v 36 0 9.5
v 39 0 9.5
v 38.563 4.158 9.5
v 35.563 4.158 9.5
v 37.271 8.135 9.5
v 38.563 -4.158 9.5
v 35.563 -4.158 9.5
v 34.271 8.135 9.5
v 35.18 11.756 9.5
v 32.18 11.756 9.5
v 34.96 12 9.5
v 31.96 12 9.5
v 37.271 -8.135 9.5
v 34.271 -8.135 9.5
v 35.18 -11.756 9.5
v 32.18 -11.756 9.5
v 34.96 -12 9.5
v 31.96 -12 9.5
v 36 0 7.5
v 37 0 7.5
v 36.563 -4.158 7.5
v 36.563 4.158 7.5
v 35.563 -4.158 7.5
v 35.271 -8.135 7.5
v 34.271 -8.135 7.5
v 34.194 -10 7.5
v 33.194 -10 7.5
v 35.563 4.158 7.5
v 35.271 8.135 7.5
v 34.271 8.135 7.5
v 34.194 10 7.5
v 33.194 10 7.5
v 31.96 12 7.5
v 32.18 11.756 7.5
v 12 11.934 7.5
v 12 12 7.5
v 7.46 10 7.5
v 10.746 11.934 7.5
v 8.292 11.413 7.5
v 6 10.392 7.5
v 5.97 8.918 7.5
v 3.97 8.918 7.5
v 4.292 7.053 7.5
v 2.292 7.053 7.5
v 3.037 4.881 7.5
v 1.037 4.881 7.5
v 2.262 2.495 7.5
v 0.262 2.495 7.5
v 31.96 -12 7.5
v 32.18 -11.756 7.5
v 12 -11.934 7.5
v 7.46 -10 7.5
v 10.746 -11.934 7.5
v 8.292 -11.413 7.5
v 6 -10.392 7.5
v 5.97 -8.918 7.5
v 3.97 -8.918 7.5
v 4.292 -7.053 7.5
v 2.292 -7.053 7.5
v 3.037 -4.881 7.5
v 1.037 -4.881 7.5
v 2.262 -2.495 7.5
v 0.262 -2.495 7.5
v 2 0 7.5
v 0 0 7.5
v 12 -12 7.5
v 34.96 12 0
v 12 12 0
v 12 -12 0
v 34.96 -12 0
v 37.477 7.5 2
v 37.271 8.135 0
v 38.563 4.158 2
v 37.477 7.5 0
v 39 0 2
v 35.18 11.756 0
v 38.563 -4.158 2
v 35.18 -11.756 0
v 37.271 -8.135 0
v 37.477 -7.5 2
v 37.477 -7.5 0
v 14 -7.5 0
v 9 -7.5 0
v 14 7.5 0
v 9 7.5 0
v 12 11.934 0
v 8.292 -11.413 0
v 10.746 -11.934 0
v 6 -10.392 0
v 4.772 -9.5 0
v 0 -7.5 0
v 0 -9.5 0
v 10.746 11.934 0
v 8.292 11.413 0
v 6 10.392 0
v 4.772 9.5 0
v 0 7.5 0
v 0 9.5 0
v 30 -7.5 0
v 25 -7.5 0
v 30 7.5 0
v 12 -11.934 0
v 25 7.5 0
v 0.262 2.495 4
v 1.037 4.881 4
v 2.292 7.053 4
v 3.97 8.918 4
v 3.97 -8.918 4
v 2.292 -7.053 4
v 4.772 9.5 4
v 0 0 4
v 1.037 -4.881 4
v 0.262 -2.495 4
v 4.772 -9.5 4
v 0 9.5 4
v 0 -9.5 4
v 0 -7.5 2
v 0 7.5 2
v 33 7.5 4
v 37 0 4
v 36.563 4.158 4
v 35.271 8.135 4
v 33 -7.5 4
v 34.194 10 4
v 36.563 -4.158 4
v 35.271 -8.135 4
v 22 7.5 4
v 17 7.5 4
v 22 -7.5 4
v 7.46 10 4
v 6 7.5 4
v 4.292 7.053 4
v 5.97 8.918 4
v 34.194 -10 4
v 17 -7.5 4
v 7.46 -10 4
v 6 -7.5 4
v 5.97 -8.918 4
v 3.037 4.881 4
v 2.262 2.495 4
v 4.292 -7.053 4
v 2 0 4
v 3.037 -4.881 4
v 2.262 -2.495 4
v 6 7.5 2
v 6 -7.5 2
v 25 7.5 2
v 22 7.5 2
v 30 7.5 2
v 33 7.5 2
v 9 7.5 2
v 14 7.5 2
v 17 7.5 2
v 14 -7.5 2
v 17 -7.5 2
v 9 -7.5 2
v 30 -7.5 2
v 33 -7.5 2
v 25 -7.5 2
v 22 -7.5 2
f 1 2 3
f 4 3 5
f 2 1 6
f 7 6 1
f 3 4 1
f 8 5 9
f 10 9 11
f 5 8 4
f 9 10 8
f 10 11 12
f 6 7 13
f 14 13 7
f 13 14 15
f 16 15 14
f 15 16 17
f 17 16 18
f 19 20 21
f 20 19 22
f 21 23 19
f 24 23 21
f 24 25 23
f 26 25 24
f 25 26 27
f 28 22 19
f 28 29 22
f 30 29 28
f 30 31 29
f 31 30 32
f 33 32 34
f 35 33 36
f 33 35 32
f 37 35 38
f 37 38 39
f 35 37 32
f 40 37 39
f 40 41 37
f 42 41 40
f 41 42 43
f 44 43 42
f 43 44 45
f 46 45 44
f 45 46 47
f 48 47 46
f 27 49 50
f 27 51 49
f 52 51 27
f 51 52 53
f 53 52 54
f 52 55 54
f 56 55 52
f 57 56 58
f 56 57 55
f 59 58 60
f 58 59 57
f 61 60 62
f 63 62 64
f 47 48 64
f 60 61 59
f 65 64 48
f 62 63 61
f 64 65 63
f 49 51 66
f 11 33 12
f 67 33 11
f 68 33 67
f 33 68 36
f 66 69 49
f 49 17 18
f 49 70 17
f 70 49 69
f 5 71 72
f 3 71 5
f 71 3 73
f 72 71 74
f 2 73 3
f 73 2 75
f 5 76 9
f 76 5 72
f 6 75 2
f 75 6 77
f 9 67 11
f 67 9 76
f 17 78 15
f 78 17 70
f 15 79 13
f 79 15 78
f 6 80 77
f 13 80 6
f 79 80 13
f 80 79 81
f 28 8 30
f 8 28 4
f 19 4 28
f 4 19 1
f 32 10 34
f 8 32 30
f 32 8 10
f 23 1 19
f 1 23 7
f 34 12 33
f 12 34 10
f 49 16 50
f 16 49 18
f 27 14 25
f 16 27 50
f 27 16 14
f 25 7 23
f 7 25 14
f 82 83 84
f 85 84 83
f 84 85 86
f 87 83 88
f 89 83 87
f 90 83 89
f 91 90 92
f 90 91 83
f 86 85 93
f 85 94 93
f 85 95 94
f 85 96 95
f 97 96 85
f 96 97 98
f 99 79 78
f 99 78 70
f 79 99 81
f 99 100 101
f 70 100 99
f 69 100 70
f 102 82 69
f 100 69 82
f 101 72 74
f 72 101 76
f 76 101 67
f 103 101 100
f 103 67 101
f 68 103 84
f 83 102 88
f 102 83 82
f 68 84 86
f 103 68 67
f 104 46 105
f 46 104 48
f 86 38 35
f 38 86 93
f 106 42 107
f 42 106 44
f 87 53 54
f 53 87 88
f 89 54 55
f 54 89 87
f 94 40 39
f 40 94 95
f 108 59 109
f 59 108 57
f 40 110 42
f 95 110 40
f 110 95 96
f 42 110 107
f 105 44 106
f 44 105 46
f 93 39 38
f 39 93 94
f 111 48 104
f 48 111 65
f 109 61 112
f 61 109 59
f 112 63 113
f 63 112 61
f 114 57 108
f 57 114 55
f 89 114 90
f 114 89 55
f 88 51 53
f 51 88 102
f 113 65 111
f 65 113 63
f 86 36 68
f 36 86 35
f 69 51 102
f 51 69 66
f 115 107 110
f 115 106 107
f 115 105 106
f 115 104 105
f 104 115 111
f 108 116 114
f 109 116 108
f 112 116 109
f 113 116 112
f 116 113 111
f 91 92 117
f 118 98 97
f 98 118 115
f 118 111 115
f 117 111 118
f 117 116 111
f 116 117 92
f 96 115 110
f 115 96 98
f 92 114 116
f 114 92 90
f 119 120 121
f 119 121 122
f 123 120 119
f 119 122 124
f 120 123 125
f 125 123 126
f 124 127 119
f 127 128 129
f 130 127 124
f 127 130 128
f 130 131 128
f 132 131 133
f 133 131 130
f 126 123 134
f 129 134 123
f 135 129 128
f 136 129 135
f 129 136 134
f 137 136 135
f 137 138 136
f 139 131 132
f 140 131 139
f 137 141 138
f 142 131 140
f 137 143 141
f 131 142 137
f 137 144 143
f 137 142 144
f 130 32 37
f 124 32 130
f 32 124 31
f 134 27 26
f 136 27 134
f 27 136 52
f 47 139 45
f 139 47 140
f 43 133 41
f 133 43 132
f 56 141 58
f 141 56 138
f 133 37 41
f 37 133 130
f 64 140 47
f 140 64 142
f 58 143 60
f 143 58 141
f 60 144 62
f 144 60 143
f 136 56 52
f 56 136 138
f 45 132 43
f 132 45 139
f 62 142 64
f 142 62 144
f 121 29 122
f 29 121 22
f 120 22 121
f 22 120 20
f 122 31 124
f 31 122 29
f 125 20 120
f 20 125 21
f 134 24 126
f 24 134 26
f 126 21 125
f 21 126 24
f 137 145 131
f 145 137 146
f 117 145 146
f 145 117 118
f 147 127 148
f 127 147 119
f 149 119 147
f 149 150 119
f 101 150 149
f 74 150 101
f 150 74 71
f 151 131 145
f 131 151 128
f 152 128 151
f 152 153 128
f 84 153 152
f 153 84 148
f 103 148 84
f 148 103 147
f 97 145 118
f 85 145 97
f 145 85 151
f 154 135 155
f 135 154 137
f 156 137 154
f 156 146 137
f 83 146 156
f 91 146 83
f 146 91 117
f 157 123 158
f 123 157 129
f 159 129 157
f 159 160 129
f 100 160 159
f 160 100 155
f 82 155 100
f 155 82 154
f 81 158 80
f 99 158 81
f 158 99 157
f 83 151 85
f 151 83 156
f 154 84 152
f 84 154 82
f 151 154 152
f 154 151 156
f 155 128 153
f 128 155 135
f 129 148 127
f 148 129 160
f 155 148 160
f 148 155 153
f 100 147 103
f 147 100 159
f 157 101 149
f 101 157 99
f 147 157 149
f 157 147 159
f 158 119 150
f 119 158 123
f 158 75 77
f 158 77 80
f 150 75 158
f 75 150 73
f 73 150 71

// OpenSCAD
// This work is licensed under a Creative Commons Attribution-ShareAlike 3.0 Unported License.
// https://creativecommons.org/licenses/by-sa/3.0/

// width of your strap material
strapWidth = 15;
// thickness of your strap material (but keep it a bit on the high side)
strapThickness = 2;
// overall plastic thickness
thickness = 2;
// length of the original clamp's jaw
jawLength = 35;
// width of the original clamp's jaw
jawWidth = 20;
// thickness of the faceplate of the original clamp's jaw
jawDepth = 3.5;

module dogTag(length, width, depth, oneDiameter, otherDiameter) {
	module envelope() {
		translate([0, width / -2, 0])
			cube([length, width, depth]);
	}
	union() {
		intersection() {
			envelope();
			translate([oneDiameter / 2, 0, 0])
				cylinder(d = oneDiameter, h = depth);
		}
		intersection() {
			translate([oneDiameter / 2, 0, 0])
				envelope();
			translate([length - otherDiameter / 2, 0, 0])
				cylinder(d=otherDiameter, h = depth);
		}
	}
}

module jawCover() {
	length = jawLength;
	width = jawWidth;
	outerLength = length + thickness * 2;
	outerWidth = width + thickness * 2;
	depth = jawDepth;
	oneDiameter = width * 1.2;
	otherDiameter = width * 2;
	translate([0, 0, depth + thickness]) {
		difference() {
			dogTag(outerLength, outerWidth, thickness, oneDiameter, otherDiameter);
			translate([-3, 0, 0])
				dogTag(outerLength, outerWidth, depth + thickness, oneDiameter, otherDiameter);
		}
	}
	difference() {
		dogTag(outerLength, outerWidth, depth + thickness, oneDiameter, otherDiameter);
		translate([thickness, 0, thickness])
			dogTag(length, width, depth, oneDiameter, otherDiameter);
	}
}

module jawStrapClamp() {
	baseThickness = strapThickness + thickness;
	length = jawLength;
	width = jawWidth;
	outerLength = length + thickness * 2;
	outerWidth = width + thickness * 2;
	depth = jawDepth;
	oneDiameter = width * 1.2;
	otherDiameter = width * 2;
	thickenedStrapWidth = strapWidth + thickness * 2;
	strapSlotWidth = strapThickness + 1;
	translate([0, 0, depth + baseThickness]) {
		difference() {
			dogTag(outerLength, outerWidth, thickness, oneDiameter, otherDiameter);
			translate([-3, 0, 0])
				dogTag(outerLength, outerWidth, depth + thickness, oneDiameter, otherDiameter);
		}
	}
	difference() {
		union() {
			translate([0, thickenedStrapWidth / -2, 0])
				cube([thickenedStrapWidth, thickenedStrapWidth, strapThickness + thickness]);
			dogTag(outerLength, outerWidth, depth + baseThickness, oneDiameter, otherDiameter);
		}
		translate([thickness, 0, baseThickness])
			dogTag(length, width, depth, oneDiameter, otherDiameter);
		translate([0, strapWidth / -2, 0]) {
			cube([6, strapWidth, strapThickness]);
			translate([6, 0, 0])
				cube([strapSlotWidth, strapWidth, baseThickness + 1]);
			translate([6 + strapThickness, 0, baseThickness - strapThickness])
				cube([6, strapWidth, strapThickness]);
			translate([14, 0, 0])
				cube([strapSlotWidth, strapWidth, baseThickness + 1]);
			translate([14 + strapThickness, 0, 0])
				cube([6, strapWidth, strapThickness]);
			translate([22, 0, 0])
				cube([strapSlotWidth, strapWidth, baseThickness + 1]);
			translate([22 + strapThickness, 0, baseThickness - strapThickness])
				cube([6, strapWidth, strapThickness]);
			translate([30, 0, 0])
				cube([strapSlotWidth, strapWidth, baseThickness + 1]);
			translate([30 + strapThickness, 0, 0])
				cube([20, strapWidth, strapThickness]);
		}
	}
}

jawStrapClamp();
